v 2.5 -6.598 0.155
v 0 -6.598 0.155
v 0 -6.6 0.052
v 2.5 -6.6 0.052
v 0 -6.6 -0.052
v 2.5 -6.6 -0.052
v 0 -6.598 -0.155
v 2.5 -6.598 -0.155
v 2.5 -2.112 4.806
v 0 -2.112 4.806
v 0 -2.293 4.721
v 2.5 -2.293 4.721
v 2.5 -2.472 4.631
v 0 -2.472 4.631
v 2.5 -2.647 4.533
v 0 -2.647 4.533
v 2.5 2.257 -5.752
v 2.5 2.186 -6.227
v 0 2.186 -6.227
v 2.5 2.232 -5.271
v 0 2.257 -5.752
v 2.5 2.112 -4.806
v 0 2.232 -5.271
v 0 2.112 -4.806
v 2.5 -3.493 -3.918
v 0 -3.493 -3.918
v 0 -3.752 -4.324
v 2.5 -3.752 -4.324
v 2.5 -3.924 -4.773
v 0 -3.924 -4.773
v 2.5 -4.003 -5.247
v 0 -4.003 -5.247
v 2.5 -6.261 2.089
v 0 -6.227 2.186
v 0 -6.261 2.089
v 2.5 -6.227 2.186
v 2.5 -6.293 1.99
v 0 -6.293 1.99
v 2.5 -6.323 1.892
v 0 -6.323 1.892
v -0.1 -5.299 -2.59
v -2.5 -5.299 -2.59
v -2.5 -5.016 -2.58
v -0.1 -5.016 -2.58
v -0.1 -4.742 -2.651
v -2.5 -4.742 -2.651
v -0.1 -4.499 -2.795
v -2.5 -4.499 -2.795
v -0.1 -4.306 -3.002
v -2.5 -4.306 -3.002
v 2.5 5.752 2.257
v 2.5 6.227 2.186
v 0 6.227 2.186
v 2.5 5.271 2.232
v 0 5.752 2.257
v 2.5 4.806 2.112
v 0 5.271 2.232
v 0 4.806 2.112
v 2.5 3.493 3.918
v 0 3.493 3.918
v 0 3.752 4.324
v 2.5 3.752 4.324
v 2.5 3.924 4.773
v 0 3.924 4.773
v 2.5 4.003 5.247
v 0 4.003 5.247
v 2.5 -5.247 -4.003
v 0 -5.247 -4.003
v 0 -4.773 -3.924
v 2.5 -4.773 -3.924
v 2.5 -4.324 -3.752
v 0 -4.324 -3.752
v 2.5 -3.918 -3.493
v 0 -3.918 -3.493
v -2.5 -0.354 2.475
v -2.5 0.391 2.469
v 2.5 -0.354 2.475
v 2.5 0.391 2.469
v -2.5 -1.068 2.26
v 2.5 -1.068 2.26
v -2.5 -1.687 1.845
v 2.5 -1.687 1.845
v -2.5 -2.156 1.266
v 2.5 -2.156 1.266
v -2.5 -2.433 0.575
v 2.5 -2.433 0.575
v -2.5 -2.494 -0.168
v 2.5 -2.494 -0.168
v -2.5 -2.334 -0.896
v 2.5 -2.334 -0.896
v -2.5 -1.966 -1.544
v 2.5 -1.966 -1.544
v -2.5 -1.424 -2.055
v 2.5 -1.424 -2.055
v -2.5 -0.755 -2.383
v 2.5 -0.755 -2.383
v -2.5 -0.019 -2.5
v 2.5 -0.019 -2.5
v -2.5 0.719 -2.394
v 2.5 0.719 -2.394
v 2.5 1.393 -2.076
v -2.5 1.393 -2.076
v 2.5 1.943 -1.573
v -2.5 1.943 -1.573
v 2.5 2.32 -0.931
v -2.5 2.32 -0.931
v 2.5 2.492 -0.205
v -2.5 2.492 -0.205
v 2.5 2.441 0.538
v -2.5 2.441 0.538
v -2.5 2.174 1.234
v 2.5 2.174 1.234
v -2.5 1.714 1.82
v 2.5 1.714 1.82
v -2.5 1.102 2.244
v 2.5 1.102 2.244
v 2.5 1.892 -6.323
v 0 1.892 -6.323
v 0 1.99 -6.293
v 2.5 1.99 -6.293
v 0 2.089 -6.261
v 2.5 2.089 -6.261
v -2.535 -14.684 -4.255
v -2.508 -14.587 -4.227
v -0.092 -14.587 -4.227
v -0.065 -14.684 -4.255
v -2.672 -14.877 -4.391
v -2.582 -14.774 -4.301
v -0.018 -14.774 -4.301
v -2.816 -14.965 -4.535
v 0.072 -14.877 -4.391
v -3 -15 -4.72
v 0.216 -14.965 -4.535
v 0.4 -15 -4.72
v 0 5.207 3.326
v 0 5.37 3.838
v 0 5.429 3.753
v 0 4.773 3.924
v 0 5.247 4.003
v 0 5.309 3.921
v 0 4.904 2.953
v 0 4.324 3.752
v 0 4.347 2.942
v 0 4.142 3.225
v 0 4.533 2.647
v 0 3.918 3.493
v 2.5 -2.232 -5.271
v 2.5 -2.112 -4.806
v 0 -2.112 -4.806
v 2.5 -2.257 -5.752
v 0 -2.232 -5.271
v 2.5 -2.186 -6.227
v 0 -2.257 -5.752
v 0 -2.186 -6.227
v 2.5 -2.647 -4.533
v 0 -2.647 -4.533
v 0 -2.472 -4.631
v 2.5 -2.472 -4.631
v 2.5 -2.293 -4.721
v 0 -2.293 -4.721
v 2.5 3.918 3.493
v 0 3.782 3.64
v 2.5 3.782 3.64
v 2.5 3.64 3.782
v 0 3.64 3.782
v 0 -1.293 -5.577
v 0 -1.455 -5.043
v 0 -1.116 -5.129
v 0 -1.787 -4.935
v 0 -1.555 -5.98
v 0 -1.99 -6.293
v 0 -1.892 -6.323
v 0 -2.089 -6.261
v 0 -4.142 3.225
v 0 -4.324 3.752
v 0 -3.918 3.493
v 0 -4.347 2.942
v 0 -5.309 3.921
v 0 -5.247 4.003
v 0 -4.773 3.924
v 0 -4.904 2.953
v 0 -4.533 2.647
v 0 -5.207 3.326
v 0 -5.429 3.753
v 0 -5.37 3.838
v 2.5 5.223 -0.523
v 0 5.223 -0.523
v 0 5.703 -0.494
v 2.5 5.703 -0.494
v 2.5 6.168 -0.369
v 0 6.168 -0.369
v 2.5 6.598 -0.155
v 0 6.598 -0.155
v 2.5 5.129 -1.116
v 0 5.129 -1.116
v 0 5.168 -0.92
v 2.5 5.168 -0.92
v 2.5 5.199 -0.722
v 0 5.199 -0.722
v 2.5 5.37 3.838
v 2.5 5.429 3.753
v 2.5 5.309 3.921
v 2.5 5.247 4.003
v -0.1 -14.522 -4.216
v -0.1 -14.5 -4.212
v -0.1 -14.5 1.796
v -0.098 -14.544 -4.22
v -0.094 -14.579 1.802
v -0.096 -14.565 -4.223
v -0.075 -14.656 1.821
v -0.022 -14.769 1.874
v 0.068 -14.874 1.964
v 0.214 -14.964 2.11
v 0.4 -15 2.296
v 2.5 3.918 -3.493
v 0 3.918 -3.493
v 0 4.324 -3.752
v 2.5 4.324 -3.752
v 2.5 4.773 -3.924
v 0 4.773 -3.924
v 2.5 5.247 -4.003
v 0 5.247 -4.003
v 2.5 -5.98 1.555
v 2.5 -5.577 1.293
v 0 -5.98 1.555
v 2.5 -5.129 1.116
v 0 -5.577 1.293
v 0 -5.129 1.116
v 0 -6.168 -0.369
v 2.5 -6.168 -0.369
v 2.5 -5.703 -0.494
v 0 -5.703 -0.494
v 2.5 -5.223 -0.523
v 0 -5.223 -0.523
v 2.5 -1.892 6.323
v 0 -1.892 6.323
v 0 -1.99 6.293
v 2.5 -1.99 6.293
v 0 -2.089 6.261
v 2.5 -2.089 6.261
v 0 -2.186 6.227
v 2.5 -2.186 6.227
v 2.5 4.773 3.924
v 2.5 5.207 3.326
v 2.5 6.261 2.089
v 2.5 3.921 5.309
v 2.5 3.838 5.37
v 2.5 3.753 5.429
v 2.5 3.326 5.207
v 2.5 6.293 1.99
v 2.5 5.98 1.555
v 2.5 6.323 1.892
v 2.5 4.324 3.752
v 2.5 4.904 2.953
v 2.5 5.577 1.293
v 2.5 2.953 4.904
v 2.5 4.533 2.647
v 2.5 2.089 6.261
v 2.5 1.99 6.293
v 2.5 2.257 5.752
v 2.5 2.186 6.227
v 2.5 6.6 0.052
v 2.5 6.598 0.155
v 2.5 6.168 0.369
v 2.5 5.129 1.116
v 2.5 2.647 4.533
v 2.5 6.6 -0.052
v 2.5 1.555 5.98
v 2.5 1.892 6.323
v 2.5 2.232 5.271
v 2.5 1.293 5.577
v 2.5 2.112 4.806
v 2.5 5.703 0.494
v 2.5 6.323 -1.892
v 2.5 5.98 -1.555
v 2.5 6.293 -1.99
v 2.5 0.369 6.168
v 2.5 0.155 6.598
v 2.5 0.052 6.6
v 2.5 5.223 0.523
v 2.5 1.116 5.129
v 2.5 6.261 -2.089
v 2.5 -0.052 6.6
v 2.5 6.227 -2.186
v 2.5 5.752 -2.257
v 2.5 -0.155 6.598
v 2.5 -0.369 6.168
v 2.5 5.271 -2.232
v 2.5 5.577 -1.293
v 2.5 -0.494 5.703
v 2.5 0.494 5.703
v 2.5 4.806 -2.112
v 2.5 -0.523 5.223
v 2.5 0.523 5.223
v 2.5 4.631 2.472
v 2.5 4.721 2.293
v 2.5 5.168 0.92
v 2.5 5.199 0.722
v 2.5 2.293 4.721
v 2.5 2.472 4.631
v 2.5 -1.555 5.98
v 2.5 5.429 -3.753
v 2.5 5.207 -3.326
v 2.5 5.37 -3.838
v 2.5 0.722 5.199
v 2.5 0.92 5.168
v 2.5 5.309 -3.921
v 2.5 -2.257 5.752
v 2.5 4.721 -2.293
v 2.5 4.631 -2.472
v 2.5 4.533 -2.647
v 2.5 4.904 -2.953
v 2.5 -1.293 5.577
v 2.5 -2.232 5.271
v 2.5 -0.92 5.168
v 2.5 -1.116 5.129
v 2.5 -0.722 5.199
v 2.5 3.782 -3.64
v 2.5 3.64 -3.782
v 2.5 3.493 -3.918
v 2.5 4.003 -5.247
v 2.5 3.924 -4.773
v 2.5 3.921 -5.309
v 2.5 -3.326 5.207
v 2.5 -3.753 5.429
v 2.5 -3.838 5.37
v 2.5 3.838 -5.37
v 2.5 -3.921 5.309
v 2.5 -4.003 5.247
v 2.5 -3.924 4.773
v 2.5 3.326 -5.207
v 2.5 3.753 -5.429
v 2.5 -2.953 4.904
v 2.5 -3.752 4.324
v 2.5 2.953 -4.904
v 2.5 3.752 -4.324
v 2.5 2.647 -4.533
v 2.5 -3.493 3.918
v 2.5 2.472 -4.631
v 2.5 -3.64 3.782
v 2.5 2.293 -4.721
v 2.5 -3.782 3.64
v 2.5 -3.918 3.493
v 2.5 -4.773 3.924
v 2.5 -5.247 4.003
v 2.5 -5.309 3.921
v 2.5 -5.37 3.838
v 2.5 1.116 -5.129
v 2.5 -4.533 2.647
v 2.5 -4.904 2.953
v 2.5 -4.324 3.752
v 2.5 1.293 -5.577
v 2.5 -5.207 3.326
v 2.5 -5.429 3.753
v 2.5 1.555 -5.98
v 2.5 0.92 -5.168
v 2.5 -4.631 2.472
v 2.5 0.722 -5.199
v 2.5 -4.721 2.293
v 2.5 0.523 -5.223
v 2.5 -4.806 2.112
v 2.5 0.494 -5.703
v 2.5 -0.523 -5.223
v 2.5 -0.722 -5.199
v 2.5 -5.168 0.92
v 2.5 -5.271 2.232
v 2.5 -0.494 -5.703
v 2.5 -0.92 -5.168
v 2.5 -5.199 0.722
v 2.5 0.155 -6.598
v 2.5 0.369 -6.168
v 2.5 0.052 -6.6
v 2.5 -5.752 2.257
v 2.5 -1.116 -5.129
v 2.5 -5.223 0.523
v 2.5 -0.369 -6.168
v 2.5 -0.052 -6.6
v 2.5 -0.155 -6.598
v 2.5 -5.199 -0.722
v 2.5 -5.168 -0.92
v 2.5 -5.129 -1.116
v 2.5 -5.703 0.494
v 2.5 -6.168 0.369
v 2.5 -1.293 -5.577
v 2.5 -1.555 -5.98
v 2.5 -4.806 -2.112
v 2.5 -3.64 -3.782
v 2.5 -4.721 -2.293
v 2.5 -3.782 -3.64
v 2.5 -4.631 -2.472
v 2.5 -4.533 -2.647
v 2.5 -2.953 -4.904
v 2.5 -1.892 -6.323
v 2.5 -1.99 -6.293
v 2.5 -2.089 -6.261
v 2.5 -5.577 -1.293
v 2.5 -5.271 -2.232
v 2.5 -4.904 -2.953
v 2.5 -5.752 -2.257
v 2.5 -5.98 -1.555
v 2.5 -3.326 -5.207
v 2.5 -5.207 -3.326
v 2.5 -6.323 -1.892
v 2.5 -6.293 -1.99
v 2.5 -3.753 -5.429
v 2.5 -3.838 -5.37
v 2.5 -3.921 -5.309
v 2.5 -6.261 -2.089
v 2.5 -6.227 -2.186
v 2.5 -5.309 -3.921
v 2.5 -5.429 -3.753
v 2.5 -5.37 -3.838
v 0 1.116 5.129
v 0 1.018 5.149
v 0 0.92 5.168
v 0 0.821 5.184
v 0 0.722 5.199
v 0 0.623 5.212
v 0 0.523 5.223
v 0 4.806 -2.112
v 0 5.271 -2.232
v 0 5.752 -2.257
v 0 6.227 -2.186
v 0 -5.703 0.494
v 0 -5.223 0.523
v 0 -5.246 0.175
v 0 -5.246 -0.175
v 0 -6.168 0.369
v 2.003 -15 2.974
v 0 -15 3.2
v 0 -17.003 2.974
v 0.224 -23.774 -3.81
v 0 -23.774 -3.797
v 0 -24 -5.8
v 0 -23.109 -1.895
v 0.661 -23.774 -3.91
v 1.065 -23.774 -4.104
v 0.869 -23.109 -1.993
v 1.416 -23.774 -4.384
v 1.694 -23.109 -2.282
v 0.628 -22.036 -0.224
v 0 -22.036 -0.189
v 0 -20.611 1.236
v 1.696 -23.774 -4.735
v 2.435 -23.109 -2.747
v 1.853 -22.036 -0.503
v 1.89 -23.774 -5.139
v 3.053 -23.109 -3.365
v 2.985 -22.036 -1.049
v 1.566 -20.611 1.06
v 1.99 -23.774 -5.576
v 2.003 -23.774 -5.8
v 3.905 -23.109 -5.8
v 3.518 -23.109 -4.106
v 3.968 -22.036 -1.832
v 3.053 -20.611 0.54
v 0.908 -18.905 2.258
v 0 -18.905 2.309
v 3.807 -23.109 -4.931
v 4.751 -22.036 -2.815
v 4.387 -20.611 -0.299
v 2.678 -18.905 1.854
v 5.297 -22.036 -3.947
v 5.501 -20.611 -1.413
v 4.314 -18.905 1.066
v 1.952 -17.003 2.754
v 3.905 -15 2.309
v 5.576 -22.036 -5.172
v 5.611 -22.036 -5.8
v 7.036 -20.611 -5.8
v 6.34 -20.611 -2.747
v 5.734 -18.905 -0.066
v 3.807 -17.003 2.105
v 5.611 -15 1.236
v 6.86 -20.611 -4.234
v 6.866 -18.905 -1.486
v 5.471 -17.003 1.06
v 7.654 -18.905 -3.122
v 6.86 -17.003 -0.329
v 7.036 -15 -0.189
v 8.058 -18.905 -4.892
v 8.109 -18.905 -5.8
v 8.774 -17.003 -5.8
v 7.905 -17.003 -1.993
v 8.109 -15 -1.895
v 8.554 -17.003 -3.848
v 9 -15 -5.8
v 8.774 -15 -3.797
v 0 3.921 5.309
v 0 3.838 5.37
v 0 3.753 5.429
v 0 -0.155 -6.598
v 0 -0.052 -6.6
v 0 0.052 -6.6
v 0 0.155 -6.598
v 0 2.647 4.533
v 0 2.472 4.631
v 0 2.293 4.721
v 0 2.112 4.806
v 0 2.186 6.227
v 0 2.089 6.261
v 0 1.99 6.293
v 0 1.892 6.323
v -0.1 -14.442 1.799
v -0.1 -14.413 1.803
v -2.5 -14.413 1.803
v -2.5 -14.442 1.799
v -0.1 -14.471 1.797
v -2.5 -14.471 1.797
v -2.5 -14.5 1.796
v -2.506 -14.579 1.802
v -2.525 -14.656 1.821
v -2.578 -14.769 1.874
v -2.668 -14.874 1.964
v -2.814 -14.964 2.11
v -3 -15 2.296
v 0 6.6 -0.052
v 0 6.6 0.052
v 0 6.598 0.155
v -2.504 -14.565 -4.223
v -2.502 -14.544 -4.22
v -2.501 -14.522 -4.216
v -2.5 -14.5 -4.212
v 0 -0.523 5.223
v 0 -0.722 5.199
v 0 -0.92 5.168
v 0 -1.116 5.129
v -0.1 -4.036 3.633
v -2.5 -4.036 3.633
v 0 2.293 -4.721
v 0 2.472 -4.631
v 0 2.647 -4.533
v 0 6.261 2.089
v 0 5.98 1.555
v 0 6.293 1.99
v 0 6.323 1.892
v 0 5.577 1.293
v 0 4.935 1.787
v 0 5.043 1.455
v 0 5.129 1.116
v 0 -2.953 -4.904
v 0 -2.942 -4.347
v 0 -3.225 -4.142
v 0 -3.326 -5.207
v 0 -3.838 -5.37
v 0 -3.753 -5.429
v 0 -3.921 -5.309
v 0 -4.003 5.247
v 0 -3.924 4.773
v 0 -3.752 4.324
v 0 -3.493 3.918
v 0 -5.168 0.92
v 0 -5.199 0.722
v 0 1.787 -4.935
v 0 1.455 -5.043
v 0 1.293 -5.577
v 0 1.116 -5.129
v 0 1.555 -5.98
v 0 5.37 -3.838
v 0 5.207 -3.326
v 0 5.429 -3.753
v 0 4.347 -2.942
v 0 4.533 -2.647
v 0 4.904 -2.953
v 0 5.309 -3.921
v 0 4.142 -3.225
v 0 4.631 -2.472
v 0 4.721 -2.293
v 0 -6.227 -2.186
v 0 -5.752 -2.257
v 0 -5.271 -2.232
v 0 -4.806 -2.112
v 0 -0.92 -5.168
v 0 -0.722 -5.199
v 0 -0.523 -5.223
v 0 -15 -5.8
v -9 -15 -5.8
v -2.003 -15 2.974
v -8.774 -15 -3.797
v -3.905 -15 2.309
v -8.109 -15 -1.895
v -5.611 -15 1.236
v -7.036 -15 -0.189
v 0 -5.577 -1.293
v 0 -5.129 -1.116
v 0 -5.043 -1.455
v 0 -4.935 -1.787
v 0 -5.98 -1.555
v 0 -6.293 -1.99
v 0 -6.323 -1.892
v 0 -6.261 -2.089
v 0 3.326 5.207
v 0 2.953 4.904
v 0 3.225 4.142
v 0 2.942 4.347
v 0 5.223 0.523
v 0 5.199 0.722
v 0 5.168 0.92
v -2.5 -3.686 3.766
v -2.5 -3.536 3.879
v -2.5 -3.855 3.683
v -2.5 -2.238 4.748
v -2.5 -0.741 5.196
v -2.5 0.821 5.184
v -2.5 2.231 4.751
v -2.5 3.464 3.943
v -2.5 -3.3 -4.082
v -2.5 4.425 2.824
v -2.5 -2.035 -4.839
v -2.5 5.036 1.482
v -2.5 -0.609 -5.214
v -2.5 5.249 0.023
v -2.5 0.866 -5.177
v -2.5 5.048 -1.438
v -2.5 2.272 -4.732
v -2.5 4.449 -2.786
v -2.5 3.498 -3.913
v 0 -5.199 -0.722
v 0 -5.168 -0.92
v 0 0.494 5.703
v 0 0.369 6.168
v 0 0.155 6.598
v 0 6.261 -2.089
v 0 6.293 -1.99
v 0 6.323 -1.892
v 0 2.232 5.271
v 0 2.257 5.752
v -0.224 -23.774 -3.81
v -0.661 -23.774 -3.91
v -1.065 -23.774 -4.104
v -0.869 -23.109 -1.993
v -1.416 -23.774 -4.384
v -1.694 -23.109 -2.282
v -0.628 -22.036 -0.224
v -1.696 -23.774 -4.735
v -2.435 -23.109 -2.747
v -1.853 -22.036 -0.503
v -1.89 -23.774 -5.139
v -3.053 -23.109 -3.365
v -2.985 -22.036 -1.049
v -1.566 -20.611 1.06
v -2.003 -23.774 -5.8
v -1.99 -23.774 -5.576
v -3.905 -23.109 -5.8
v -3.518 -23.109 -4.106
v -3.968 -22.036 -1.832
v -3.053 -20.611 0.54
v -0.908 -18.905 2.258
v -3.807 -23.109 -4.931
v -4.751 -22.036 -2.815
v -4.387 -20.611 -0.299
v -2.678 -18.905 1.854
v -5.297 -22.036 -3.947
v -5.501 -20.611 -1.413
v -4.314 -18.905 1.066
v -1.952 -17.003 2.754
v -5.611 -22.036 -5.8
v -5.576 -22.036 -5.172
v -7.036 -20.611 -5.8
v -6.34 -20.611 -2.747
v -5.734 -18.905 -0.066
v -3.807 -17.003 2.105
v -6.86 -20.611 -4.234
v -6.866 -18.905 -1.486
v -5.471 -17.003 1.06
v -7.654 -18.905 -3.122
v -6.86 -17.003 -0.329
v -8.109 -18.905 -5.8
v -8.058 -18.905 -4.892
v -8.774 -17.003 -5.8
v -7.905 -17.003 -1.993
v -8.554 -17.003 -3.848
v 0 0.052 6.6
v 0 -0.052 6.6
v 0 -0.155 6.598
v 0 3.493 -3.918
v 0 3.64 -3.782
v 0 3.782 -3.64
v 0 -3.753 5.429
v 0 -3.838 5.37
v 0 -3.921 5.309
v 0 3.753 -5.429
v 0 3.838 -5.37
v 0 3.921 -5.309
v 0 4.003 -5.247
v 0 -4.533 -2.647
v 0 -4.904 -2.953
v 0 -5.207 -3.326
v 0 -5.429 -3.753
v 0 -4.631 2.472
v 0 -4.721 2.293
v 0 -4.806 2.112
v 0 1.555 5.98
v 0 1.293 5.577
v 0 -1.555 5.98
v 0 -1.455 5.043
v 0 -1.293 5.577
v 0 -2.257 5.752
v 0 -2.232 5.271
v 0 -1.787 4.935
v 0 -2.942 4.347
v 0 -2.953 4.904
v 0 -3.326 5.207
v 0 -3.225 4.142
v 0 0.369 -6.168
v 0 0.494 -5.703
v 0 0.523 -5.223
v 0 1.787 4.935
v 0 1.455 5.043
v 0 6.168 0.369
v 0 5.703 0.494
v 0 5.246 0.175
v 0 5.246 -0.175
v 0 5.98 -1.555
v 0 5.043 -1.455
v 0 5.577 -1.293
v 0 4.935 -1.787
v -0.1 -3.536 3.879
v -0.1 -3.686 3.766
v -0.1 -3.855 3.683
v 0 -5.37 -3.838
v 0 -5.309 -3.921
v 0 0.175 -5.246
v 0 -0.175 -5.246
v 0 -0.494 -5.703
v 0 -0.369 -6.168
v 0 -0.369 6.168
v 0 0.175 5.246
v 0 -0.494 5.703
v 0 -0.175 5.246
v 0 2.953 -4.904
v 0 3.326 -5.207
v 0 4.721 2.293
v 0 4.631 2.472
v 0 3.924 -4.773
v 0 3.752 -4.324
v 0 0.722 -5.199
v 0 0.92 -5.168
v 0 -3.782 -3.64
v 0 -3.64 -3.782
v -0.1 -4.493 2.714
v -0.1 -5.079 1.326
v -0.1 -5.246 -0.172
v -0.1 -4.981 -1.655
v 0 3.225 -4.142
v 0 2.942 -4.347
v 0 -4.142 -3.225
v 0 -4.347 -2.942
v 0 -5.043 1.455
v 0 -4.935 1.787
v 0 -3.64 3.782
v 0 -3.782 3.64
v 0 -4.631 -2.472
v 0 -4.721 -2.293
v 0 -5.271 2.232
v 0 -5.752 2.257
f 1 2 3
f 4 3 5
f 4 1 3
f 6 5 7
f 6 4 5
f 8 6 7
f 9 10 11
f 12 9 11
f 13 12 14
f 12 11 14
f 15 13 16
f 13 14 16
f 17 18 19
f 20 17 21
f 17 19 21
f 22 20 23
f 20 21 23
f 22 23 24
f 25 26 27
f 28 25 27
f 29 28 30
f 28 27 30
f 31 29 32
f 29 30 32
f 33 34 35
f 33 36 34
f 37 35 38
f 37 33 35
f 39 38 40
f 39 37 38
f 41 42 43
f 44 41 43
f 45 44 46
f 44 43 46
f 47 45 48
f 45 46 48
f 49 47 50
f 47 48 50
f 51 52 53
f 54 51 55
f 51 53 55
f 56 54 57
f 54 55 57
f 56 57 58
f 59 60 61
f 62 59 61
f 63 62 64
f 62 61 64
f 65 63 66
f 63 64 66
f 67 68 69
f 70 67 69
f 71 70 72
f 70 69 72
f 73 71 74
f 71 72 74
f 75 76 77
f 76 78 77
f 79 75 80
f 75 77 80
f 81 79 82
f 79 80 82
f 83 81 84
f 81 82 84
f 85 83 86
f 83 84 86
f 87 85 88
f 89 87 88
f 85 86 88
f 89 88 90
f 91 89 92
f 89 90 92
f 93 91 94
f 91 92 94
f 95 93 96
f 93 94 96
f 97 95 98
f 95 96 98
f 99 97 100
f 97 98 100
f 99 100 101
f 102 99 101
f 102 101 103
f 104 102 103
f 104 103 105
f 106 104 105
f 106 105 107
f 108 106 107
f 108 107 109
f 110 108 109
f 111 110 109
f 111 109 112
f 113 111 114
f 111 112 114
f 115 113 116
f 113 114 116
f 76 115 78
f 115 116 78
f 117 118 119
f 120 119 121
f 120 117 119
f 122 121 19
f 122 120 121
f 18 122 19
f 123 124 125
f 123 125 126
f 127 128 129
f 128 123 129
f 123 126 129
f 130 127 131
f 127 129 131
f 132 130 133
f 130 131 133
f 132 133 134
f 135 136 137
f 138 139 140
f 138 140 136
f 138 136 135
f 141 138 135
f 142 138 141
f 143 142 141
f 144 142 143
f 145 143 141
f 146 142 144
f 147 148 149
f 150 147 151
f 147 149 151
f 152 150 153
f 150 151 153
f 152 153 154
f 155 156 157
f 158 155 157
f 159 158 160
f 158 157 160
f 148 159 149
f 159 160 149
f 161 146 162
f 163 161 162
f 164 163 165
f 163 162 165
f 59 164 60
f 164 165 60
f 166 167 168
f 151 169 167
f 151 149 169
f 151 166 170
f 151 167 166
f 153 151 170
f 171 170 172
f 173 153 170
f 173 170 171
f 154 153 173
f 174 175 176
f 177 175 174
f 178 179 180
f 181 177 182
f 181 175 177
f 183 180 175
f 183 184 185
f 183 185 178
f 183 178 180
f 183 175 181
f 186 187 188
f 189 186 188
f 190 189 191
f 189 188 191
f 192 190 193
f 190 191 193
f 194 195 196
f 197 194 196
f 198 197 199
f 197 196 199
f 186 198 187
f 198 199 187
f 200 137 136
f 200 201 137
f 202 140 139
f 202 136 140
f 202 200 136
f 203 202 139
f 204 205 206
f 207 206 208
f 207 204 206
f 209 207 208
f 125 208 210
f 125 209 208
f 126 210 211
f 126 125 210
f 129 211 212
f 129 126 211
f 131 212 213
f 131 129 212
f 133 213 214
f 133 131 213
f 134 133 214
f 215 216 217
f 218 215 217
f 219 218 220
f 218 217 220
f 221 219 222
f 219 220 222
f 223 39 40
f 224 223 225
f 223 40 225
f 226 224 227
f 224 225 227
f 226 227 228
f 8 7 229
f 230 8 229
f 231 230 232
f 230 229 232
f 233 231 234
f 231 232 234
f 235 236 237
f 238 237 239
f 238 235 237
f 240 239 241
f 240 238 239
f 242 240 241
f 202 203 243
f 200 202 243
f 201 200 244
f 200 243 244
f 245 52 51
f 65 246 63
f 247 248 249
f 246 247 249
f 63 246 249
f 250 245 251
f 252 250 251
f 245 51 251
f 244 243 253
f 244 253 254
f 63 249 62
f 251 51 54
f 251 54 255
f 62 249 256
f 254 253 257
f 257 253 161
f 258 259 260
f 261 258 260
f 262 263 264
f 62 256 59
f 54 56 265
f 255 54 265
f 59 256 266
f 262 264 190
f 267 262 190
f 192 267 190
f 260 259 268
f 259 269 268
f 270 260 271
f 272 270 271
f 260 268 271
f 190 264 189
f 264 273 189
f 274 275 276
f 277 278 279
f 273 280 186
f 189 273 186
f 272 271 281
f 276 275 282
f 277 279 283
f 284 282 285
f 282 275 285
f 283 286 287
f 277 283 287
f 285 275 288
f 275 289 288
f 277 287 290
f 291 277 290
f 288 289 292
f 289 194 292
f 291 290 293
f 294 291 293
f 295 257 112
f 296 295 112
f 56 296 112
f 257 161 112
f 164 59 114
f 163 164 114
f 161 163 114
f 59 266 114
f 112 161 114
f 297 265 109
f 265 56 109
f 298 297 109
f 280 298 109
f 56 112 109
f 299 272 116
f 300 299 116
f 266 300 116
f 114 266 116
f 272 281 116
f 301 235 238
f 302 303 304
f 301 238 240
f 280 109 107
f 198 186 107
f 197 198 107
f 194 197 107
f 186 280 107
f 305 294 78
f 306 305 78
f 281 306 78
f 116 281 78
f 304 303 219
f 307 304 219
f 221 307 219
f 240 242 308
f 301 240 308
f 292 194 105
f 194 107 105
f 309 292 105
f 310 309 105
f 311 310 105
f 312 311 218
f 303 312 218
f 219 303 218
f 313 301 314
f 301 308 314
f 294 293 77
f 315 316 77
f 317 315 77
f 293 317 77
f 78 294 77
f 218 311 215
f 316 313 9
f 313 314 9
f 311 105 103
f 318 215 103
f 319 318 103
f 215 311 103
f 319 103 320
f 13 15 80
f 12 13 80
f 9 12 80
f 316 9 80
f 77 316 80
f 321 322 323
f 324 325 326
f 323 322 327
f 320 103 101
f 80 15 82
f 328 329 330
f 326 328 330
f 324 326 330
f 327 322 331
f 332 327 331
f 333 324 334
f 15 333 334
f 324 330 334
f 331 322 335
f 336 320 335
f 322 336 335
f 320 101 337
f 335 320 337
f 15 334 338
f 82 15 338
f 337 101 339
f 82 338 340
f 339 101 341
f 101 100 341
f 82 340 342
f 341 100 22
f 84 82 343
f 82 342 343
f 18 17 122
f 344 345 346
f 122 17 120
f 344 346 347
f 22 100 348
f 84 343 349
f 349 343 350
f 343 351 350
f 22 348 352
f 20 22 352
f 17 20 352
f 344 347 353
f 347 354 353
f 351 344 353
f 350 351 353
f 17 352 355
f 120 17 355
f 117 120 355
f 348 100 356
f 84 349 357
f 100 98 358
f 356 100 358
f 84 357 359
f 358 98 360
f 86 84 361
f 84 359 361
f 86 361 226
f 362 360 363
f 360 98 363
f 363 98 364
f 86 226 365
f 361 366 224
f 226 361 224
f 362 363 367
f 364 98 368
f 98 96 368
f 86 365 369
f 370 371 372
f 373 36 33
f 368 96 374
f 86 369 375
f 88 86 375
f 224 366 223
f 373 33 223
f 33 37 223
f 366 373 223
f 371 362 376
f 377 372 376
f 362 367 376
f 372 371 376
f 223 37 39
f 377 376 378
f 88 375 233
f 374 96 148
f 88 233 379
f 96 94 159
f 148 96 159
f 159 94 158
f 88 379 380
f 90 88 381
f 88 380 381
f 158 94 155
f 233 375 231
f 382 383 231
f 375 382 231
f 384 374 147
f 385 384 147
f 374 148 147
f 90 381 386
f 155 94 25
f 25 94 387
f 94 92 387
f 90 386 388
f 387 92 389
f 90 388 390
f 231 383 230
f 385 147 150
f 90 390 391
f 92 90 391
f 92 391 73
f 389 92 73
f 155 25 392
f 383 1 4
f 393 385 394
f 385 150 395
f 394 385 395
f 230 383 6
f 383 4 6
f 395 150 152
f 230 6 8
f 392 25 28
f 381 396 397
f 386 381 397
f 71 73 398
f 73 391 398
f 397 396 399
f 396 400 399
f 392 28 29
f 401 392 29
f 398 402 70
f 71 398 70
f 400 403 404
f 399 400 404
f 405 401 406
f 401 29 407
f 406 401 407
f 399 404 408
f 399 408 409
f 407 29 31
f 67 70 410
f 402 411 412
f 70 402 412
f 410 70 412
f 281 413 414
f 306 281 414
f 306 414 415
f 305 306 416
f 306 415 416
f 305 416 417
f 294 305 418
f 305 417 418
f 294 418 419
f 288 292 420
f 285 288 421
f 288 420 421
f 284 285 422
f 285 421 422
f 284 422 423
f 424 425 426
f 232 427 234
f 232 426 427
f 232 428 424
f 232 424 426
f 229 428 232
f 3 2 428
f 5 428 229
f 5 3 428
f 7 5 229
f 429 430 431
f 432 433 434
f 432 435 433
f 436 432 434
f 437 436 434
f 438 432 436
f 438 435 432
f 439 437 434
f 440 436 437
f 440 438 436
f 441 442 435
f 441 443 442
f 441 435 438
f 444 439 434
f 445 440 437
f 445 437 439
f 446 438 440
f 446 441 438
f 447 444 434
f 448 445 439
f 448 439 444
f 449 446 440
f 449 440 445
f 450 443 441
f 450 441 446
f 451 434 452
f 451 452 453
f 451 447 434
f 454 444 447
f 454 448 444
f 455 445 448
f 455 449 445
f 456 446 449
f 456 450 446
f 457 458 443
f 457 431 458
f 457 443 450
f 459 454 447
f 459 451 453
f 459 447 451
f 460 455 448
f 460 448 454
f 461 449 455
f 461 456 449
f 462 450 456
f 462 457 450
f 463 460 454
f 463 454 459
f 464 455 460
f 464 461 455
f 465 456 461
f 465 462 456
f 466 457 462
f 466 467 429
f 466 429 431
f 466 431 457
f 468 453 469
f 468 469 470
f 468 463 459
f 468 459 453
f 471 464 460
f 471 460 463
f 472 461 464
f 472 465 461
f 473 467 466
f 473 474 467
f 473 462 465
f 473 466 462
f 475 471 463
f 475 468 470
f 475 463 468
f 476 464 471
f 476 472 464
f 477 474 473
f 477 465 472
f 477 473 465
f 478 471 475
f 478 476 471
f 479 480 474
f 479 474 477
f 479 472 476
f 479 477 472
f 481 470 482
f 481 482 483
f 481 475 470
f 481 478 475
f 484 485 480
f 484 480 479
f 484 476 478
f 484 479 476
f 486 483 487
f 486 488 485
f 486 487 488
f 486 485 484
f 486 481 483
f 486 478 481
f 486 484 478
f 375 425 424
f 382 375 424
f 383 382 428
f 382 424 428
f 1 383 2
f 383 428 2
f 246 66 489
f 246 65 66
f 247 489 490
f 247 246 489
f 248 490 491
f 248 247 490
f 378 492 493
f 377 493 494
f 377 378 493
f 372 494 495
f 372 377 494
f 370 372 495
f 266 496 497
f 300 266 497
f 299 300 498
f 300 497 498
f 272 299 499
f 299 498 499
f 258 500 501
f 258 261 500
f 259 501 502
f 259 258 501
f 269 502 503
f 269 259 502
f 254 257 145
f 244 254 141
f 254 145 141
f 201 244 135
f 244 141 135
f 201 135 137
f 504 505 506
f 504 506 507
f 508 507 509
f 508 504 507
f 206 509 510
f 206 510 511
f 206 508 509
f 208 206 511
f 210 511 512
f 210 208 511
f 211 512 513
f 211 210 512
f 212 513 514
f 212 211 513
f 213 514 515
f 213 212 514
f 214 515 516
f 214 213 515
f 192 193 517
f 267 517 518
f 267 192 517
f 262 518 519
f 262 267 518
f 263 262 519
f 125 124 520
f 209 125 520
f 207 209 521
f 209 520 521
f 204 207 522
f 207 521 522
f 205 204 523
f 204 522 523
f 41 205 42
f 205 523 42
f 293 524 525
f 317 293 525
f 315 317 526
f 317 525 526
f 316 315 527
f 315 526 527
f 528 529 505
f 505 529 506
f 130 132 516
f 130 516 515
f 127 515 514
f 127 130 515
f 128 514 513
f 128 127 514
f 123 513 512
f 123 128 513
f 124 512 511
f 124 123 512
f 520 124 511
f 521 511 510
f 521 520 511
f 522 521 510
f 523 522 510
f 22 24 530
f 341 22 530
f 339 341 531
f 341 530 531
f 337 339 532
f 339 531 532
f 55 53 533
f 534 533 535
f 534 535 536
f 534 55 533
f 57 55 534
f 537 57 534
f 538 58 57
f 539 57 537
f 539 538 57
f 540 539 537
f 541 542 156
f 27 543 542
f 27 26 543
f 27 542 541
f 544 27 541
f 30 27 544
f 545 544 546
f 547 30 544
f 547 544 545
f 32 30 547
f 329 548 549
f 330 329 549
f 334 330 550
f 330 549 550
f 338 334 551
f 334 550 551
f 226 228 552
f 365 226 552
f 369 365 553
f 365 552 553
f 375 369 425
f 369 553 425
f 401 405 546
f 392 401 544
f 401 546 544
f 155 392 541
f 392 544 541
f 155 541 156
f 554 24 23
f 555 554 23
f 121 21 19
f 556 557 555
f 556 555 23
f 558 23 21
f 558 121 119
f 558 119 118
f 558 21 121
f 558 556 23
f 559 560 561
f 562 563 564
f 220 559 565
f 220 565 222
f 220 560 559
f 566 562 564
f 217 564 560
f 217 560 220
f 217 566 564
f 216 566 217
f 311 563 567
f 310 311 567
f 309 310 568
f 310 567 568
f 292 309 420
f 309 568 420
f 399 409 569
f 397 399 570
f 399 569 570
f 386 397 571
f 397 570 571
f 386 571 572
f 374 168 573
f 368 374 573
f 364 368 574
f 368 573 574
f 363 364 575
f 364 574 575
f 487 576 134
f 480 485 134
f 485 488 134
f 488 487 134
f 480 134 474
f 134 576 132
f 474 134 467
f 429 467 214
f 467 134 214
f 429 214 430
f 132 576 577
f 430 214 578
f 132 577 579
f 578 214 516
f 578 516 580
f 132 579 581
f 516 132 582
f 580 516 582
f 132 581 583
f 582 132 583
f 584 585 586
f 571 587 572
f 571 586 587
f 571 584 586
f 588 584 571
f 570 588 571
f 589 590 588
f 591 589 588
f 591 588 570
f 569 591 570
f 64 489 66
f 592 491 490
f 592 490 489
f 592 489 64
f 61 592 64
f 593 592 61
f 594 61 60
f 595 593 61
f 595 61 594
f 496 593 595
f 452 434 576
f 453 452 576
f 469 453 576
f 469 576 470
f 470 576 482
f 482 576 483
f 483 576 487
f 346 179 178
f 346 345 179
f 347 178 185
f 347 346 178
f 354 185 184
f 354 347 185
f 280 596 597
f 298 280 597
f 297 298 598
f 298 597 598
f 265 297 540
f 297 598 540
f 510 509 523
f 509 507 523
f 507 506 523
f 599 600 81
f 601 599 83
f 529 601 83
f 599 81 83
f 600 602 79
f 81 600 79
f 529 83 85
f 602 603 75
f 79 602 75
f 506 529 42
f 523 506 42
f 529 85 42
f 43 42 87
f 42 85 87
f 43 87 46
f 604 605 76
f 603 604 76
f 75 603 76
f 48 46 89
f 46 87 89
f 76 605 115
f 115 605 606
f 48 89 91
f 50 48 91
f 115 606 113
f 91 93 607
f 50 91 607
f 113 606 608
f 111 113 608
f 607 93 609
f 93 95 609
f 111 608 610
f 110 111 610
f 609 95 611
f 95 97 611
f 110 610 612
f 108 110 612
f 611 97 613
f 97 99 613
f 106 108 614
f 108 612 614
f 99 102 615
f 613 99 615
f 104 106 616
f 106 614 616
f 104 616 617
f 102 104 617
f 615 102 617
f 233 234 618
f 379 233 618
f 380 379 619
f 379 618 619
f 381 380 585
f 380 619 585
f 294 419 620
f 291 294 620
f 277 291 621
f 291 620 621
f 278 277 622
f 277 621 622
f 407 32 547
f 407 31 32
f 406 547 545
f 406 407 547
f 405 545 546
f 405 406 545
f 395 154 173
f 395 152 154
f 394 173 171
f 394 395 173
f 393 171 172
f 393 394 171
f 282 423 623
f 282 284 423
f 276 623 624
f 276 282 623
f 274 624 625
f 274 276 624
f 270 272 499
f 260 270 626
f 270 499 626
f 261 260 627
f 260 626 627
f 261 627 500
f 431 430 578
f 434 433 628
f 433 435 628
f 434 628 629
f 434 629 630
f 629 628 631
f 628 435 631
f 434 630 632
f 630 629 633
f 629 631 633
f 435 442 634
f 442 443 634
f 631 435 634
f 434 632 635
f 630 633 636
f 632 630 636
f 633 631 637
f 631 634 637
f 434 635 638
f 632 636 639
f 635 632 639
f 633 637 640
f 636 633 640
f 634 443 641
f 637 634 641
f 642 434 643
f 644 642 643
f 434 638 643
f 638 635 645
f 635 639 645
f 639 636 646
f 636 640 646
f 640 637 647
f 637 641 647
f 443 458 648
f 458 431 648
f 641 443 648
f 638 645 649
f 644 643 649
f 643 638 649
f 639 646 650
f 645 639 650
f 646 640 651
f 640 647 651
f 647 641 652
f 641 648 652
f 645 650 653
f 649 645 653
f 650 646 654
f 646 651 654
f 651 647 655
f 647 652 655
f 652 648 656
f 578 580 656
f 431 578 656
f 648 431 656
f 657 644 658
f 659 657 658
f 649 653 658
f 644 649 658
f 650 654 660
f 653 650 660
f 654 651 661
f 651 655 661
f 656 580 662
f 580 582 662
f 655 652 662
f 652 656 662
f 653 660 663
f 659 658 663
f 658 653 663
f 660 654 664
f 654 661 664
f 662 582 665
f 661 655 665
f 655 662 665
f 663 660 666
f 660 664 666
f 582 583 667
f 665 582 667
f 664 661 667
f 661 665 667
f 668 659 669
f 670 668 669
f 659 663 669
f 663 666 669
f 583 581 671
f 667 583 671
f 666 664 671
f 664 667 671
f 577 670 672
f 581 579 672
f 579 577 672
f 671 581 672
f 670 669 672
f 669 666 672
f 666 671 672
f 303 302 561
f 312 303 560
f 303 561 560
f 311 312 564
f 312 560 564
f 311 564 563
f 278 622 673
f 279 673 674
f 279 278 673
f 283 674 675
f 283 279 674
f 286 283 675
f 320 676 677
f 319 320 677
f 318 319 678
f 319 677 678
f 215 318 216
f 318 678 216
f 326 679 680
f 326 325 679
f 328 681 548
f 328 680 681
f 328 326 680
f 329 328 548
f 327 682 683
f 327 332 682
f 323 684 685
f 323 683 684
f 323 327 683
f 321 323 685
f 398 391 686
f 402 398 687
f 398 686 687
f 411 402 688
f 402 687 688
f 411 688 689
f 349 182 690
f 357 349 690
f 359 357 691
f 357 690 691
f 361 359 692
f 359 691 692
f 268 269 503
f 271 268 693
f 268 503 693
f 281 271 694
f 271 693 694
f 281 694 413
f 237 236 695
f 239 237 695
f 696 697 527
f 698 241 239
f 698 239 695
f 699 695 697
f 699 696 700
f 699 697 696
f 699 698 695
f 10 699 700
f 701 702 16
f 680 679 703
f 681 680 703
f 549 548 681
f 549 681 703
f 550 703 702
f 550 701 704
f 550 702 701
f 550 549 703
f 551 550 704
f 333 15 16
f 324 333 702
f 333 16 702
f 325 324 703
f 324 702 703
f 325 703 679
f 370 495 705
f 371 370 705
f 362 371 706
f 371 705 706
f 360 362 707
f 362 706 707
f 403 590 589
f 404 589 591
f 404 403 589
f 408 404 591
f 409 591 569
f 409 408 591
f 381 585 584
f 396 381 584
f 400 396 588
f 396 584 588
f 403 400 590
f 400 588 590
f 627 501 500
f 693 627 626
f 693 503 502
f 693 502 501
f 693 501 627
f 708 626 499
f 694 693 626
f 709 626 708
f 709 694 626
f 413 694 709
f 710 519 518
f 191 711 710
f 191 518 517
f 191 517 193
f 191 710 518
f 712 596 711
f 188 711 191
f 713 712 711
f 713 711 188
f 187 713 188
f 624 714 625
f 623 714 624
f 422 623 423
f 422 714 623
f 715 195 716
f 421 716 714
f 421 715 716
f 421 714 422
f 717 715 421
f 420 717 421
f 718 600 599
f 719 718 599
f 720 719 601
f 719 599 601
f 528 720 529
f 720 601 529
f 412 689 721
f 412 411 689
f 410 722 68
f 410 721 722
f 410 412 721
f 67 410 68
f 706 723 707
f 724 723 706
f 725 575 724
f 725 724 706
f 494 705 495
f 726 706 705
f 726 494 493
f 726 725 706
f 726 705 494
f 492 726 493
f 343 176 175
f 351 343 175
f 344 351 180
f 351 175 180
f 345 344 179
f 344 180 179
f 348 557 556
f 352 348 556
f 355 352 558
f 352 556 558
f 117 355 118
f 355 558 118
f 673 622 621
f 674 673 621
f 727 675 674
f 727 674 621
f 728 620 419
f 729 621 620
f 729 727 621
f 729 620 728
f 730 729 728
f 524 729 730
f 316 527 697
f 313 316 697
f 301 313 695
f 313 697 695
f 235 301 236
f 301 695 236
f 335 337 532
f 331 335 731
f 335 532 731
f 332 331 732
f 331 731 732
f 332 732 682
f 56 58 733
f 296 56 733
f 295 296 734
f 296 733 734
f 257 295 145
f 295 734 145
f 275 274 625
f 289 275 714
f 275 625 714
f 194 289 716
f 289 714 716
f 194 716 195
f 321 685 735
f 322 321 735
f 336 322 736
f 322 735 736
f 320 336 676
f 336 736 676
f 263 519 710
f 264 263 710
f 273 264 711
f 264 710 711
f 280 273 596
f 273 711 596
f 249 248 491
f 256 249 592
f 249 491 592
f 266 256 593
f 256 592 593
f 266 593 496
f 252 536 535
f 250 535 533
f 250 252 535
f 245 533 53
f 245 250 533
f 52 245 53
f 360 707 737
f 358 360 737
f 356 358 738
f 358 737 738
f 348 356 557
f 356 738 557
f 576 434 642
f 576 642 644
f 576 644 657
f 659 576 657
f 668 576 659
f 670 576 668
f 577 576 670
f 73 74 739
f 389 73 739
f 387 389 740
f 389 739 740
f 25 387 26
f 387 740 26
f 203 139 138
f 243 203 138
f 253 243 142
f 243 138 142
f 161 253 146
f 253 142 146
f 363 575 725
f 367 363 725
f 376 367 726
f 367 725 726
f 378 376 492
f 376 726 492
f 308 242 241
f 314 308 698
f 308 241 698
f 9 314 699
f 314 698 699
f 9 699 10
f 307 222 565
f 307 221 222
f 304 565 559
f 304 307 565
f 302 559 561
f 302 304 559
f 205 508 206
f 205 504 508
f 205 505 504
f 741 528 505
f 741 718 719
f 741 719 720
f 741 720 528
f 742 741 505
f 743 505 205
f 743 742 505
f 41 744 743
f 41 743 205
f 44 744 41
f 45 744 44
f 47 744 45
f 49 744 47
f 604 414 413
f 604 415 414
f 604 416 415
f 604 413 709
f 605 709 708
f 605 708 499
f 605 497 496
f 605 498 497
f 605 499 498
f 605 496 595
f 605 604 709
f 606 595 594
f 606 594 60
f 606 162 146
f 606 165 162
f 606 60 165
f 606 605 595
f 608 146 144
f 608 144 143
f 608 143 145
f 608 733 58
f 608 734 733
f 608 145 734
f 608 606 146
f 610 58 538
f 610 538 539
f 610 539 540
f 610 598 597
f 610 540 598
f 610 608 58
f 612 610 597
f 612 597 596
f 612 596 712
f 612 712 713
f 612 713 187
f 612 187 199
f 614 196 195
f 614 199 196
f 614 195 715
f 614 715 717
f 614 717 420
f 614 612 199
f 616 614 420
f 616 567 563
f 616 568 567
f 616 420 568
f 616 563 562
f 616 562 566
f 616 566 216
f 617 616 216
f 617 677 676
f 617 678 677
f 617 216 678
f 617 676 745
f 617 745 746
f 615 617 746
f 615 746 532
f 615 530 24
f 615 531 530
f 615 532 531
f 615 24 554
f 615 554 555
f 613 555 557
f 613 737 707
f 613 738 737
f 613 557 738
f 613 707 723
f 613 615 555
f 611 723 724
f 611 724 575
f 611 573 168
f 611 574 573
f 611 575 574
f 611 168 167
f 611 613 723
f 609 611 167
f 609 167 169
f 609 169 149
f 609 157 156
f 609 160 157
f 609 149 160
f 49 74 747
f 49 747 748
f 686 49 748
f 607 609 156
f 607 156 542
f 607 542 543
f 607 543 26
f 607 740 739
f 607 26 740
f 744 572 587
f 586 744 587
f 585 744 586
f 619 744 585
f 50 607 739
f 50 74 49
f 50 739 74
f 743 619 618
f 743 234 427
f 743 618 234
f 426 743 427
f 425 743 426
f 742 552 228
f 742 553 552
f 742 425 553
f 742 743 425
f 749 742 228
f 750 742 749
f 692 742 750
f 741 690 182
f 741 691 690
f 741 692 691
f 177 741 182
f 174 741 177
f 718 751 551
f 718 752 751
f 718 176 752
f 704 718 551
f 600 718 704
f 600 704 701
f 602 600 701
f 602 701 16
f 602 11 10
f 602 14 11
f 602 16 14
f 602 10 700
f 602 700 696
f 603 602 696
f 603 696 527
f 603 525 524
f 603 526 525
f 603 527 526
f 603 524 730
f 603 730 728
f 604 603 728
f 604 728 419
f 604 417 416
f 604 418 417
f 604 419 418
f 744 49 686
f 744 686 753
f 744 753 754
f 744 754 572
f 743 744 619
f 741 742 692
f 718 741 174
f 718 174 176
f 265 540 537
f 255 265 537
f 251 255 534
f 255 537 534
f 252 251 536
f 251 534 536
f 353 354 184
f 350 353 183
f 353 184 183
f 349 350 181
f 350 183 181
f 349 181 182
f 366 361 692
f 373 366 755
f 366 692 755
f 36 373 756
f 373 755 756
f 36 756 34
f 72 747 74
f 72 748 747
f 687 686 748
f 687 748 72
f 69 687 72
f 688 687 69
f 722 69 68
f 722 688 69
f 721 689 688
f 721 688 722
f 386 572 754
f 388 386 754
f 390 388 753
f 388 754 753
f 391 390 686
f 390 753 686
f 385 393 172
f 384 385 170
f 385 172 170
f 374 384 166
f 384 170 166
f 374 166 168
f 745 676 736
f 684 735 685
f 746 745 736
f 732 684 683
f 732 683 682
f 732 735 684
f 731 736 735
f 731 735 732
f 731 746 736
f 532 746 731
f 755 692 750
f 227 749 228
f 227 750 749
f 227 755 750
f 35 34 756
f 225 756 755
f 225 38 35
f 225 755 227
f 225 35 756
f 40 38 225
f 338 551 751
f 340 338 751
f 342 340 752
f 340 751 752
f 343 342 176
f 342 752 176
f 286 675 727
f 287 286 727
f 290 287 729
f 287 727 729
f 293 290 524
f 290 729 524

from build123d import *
from build123d.topology import SkipClean

# Parameters (mm, degrees)
BASPROSKE_W               = 2.5
BASPROSKE_H               = 6.6
TOOTHCUT_DEPTH            = 10.662815325
TEETHCUTS_COUNT           = 20
TEETHCUTS_ANGLE           = 342
HUBNEARONE_START          = 2.5000508
HUBNEAONESKE_R            = 5.249
HUBNEARONE_DEPTH          = 2.5000508
BORSKE_R                  = 2.5
BORE_DEPTH                = 5.0000508
MOVE_BODY_1_ANGLE         = 9
REVOLVE_1_ANGLE           = 90
REVOLVE_1_OTHER_WAY_ANGLE = 90
EXTRUDE_1_DEPTH           = 2.4
FILLET_1_R                = 1
FILLET_2_R                = 0.5


with BuildPart() as part:
    # BasProSke → Base-Revolve (revolve)
    with BuildSketch(Plane(origin=(0, 0, 0), x_dir=(1, 0, 0), z_dir=(0, 1, 0)), mode=Mode.PRIVATE) as base_revolve_sk:
        with Locations((1.25, 3.3)):
            Rectangle(BASPROSKE_W, BASPROSKE_H)
    revolve(base_revolve_sk.sketch.rotate(Axis((-10, 0, 0), (1, 0, 0)), 180), axis=Axis((-10, 0, 0), (1, 0, 0)))

    # TooCutSke → ToothCut (cut, through all)
    with BuildSketch(Plane(origin=(0, 0, 0), x_dir=(0, 0, -1), z_dir=(1, 0, 0))):
        with BuildLine():
            ThreePointArc((0.300213811, 5.240407681), (0, 5.249), (-0.300213811, 5.240407681))
            ThreePointArc((-0.300213811, 5.240407681), (-0.497369534, 5.948676387), (-0.899680168, 6.564030831))
            ThreePointArc((-0.899680168, 6.564030831), (0, 6.6254), (0.899680168, 6.564030831))
            ThreePointArc((0.899680168, 6.564030831), (0.497369534, 5.948676387), (0.300213811, 5.240407681))
        make_face()
    toothcut = extrude(amount=TOOTHCUT_DEPTH, mode=Mode.SUBTRACT)

    # TeethCuts: ToothCut ×20 about axis
    teethcuts_axis = Axis((-10, 0, 0), (1, 0, 0))
    for i in range(1, TEETHCUTS_COUNT):
        add(toothcut.rotate(teethcuts_axis, i * TEETHCUTS_ANGLE / (TEETHCUTS_COUNT - 1)), mode=Mode.SUBTRACT)

    # HubNeaOneSke → HubNearOne (add)
    with SkipClean():  # the faces are left unmerged after this step: merging them gives an invalid solid
        with BuildSketch(Plane.ZY.offset(HUBNEARONE_START)):
            Circle(HUBNEAONESKE_R)
        extrude(amount=-HUBNEARONE_DEPTH)

    # BorSke → Bore (cut, symmetric)
    with SkipClean():  # the faces are left unmerged after this step: merging them gives an invalid solid
        with BuildSketch(Plane(origin=(0, 0, 0), x_dir=(0, 0, -1), z_dir=(1, 0, 0))):
            with Locations(Location((0, 0, 0), (0, 0, 180))):
                Circle(BORSKE_R)
        extrude(amount=BORE_DEPTH, both=True, mode=Mode.SUBTRACT)


with BuildPart() as part_1:
    # Move Body 1: moved
    add(part.part.rotate(Axis((0, 0, 0), (-1, 0, 0)), MOVE_BODY_1_ANGLE))



with BuildPart() as body_2:
    # 草图4 → 旋转1 (revolve)
    with BuildSketch(Plane(origin=(0, -5.800690391, 0.605708681), x_dir=(0, 0, -1), z_dir=(1, 0, 0))):
        with BuildLine():
            Line((6.405708681, -9.199309609), (6.405708681, -18.199309609))
            ThreePointArc((6.405708681, -18.199309609), (0.04174765, -15.56327064), (-2.594291319, -9.199309609))
            Line((-2.594291319, -9.199309609), (6.405708681, -9.199309609))
        make_face()
    revolve(axis=Axis((0, -15, -5.8), (0, -1, 0)), revolution_arc=REVOLVE_1_ANGLE)

    # 草图4 → 旋转1 other way (revolve)
    with SkipClean():  # the faces are left unmerged after this step: merging them gives an invalid solid
        with BuildSketch(Plane(origin=(0, -5.800690391, 0.605708681), x_dir=(0, 0, -1), z_dir=(1, 0, 0))):
            with BuildLine():
                Line((6.405708681, -9.199309609), (6.405708681, -18.199309609))
                ThreePointArc((6.405708681, -18.199309609), (0.04174765, -15.56327064), (-2.594291319, -9.199309609))
                Line((-2.594291319, -9.199309609), (6.405708681, -9.199309609))
            make_face()
        revolve(axis=Axis((0, -15, -5.8), (0, 1, 0)), revolution_arc=REVOLVE_1_OTHER_WAY_ANGLE)


with BuildPart() as part_2:
    with SkipClean():  # the faces are left unmerged after this step: merging them gives an invalid solid
        add(part_1.part)

        add(body_2.part)  # 凸台-拉伸1 merges body 2
        # 草图5 → 凸台-拉伸1 (add)
        with BuildSketch(Plane.ZY.offset(2.5000508)):
            with BuildLine():
                Line((-4.3, -15), (-2.38467349, -4.137643583))
                ThreePointArc((-2.38467349, -4.137643583), (0.97980655, -4.674049764), (3.845615938, -2.83160734))
                Line((3.845615938, -2.83160734), (1.7, -15))
                Line((1.7, -15), (-4.3, -15))
            make_face()
        extrude(amount=-EXTRUDE_1_DEPTH)

    # 圆角1
    fillet_1_edges = [part_2.edges().sort_by_distance(p)[0] for p in [
        (-1.3000508, -4.630675276, -2.471608279),
        (-1.3000508, -3.737073108, 3.685957893),
    ]]
    fillet(fillet_1_edges, radius=FILLET_1_R)

    # 圆角2
    fillet_2_edges = [part_2.edges().sort_by_distance(p)[0] for p in [
        (-0.1000508, -15, -1.3),
        (-1.3000508, -15, 1.7),
        (-1.3000508, -15, -4.3),
        (-2.5000508, -15, -1.3),
    ]]
    fillet(fillet_2_edges, radius=FILLET_2_R)


solid = part_2.part
